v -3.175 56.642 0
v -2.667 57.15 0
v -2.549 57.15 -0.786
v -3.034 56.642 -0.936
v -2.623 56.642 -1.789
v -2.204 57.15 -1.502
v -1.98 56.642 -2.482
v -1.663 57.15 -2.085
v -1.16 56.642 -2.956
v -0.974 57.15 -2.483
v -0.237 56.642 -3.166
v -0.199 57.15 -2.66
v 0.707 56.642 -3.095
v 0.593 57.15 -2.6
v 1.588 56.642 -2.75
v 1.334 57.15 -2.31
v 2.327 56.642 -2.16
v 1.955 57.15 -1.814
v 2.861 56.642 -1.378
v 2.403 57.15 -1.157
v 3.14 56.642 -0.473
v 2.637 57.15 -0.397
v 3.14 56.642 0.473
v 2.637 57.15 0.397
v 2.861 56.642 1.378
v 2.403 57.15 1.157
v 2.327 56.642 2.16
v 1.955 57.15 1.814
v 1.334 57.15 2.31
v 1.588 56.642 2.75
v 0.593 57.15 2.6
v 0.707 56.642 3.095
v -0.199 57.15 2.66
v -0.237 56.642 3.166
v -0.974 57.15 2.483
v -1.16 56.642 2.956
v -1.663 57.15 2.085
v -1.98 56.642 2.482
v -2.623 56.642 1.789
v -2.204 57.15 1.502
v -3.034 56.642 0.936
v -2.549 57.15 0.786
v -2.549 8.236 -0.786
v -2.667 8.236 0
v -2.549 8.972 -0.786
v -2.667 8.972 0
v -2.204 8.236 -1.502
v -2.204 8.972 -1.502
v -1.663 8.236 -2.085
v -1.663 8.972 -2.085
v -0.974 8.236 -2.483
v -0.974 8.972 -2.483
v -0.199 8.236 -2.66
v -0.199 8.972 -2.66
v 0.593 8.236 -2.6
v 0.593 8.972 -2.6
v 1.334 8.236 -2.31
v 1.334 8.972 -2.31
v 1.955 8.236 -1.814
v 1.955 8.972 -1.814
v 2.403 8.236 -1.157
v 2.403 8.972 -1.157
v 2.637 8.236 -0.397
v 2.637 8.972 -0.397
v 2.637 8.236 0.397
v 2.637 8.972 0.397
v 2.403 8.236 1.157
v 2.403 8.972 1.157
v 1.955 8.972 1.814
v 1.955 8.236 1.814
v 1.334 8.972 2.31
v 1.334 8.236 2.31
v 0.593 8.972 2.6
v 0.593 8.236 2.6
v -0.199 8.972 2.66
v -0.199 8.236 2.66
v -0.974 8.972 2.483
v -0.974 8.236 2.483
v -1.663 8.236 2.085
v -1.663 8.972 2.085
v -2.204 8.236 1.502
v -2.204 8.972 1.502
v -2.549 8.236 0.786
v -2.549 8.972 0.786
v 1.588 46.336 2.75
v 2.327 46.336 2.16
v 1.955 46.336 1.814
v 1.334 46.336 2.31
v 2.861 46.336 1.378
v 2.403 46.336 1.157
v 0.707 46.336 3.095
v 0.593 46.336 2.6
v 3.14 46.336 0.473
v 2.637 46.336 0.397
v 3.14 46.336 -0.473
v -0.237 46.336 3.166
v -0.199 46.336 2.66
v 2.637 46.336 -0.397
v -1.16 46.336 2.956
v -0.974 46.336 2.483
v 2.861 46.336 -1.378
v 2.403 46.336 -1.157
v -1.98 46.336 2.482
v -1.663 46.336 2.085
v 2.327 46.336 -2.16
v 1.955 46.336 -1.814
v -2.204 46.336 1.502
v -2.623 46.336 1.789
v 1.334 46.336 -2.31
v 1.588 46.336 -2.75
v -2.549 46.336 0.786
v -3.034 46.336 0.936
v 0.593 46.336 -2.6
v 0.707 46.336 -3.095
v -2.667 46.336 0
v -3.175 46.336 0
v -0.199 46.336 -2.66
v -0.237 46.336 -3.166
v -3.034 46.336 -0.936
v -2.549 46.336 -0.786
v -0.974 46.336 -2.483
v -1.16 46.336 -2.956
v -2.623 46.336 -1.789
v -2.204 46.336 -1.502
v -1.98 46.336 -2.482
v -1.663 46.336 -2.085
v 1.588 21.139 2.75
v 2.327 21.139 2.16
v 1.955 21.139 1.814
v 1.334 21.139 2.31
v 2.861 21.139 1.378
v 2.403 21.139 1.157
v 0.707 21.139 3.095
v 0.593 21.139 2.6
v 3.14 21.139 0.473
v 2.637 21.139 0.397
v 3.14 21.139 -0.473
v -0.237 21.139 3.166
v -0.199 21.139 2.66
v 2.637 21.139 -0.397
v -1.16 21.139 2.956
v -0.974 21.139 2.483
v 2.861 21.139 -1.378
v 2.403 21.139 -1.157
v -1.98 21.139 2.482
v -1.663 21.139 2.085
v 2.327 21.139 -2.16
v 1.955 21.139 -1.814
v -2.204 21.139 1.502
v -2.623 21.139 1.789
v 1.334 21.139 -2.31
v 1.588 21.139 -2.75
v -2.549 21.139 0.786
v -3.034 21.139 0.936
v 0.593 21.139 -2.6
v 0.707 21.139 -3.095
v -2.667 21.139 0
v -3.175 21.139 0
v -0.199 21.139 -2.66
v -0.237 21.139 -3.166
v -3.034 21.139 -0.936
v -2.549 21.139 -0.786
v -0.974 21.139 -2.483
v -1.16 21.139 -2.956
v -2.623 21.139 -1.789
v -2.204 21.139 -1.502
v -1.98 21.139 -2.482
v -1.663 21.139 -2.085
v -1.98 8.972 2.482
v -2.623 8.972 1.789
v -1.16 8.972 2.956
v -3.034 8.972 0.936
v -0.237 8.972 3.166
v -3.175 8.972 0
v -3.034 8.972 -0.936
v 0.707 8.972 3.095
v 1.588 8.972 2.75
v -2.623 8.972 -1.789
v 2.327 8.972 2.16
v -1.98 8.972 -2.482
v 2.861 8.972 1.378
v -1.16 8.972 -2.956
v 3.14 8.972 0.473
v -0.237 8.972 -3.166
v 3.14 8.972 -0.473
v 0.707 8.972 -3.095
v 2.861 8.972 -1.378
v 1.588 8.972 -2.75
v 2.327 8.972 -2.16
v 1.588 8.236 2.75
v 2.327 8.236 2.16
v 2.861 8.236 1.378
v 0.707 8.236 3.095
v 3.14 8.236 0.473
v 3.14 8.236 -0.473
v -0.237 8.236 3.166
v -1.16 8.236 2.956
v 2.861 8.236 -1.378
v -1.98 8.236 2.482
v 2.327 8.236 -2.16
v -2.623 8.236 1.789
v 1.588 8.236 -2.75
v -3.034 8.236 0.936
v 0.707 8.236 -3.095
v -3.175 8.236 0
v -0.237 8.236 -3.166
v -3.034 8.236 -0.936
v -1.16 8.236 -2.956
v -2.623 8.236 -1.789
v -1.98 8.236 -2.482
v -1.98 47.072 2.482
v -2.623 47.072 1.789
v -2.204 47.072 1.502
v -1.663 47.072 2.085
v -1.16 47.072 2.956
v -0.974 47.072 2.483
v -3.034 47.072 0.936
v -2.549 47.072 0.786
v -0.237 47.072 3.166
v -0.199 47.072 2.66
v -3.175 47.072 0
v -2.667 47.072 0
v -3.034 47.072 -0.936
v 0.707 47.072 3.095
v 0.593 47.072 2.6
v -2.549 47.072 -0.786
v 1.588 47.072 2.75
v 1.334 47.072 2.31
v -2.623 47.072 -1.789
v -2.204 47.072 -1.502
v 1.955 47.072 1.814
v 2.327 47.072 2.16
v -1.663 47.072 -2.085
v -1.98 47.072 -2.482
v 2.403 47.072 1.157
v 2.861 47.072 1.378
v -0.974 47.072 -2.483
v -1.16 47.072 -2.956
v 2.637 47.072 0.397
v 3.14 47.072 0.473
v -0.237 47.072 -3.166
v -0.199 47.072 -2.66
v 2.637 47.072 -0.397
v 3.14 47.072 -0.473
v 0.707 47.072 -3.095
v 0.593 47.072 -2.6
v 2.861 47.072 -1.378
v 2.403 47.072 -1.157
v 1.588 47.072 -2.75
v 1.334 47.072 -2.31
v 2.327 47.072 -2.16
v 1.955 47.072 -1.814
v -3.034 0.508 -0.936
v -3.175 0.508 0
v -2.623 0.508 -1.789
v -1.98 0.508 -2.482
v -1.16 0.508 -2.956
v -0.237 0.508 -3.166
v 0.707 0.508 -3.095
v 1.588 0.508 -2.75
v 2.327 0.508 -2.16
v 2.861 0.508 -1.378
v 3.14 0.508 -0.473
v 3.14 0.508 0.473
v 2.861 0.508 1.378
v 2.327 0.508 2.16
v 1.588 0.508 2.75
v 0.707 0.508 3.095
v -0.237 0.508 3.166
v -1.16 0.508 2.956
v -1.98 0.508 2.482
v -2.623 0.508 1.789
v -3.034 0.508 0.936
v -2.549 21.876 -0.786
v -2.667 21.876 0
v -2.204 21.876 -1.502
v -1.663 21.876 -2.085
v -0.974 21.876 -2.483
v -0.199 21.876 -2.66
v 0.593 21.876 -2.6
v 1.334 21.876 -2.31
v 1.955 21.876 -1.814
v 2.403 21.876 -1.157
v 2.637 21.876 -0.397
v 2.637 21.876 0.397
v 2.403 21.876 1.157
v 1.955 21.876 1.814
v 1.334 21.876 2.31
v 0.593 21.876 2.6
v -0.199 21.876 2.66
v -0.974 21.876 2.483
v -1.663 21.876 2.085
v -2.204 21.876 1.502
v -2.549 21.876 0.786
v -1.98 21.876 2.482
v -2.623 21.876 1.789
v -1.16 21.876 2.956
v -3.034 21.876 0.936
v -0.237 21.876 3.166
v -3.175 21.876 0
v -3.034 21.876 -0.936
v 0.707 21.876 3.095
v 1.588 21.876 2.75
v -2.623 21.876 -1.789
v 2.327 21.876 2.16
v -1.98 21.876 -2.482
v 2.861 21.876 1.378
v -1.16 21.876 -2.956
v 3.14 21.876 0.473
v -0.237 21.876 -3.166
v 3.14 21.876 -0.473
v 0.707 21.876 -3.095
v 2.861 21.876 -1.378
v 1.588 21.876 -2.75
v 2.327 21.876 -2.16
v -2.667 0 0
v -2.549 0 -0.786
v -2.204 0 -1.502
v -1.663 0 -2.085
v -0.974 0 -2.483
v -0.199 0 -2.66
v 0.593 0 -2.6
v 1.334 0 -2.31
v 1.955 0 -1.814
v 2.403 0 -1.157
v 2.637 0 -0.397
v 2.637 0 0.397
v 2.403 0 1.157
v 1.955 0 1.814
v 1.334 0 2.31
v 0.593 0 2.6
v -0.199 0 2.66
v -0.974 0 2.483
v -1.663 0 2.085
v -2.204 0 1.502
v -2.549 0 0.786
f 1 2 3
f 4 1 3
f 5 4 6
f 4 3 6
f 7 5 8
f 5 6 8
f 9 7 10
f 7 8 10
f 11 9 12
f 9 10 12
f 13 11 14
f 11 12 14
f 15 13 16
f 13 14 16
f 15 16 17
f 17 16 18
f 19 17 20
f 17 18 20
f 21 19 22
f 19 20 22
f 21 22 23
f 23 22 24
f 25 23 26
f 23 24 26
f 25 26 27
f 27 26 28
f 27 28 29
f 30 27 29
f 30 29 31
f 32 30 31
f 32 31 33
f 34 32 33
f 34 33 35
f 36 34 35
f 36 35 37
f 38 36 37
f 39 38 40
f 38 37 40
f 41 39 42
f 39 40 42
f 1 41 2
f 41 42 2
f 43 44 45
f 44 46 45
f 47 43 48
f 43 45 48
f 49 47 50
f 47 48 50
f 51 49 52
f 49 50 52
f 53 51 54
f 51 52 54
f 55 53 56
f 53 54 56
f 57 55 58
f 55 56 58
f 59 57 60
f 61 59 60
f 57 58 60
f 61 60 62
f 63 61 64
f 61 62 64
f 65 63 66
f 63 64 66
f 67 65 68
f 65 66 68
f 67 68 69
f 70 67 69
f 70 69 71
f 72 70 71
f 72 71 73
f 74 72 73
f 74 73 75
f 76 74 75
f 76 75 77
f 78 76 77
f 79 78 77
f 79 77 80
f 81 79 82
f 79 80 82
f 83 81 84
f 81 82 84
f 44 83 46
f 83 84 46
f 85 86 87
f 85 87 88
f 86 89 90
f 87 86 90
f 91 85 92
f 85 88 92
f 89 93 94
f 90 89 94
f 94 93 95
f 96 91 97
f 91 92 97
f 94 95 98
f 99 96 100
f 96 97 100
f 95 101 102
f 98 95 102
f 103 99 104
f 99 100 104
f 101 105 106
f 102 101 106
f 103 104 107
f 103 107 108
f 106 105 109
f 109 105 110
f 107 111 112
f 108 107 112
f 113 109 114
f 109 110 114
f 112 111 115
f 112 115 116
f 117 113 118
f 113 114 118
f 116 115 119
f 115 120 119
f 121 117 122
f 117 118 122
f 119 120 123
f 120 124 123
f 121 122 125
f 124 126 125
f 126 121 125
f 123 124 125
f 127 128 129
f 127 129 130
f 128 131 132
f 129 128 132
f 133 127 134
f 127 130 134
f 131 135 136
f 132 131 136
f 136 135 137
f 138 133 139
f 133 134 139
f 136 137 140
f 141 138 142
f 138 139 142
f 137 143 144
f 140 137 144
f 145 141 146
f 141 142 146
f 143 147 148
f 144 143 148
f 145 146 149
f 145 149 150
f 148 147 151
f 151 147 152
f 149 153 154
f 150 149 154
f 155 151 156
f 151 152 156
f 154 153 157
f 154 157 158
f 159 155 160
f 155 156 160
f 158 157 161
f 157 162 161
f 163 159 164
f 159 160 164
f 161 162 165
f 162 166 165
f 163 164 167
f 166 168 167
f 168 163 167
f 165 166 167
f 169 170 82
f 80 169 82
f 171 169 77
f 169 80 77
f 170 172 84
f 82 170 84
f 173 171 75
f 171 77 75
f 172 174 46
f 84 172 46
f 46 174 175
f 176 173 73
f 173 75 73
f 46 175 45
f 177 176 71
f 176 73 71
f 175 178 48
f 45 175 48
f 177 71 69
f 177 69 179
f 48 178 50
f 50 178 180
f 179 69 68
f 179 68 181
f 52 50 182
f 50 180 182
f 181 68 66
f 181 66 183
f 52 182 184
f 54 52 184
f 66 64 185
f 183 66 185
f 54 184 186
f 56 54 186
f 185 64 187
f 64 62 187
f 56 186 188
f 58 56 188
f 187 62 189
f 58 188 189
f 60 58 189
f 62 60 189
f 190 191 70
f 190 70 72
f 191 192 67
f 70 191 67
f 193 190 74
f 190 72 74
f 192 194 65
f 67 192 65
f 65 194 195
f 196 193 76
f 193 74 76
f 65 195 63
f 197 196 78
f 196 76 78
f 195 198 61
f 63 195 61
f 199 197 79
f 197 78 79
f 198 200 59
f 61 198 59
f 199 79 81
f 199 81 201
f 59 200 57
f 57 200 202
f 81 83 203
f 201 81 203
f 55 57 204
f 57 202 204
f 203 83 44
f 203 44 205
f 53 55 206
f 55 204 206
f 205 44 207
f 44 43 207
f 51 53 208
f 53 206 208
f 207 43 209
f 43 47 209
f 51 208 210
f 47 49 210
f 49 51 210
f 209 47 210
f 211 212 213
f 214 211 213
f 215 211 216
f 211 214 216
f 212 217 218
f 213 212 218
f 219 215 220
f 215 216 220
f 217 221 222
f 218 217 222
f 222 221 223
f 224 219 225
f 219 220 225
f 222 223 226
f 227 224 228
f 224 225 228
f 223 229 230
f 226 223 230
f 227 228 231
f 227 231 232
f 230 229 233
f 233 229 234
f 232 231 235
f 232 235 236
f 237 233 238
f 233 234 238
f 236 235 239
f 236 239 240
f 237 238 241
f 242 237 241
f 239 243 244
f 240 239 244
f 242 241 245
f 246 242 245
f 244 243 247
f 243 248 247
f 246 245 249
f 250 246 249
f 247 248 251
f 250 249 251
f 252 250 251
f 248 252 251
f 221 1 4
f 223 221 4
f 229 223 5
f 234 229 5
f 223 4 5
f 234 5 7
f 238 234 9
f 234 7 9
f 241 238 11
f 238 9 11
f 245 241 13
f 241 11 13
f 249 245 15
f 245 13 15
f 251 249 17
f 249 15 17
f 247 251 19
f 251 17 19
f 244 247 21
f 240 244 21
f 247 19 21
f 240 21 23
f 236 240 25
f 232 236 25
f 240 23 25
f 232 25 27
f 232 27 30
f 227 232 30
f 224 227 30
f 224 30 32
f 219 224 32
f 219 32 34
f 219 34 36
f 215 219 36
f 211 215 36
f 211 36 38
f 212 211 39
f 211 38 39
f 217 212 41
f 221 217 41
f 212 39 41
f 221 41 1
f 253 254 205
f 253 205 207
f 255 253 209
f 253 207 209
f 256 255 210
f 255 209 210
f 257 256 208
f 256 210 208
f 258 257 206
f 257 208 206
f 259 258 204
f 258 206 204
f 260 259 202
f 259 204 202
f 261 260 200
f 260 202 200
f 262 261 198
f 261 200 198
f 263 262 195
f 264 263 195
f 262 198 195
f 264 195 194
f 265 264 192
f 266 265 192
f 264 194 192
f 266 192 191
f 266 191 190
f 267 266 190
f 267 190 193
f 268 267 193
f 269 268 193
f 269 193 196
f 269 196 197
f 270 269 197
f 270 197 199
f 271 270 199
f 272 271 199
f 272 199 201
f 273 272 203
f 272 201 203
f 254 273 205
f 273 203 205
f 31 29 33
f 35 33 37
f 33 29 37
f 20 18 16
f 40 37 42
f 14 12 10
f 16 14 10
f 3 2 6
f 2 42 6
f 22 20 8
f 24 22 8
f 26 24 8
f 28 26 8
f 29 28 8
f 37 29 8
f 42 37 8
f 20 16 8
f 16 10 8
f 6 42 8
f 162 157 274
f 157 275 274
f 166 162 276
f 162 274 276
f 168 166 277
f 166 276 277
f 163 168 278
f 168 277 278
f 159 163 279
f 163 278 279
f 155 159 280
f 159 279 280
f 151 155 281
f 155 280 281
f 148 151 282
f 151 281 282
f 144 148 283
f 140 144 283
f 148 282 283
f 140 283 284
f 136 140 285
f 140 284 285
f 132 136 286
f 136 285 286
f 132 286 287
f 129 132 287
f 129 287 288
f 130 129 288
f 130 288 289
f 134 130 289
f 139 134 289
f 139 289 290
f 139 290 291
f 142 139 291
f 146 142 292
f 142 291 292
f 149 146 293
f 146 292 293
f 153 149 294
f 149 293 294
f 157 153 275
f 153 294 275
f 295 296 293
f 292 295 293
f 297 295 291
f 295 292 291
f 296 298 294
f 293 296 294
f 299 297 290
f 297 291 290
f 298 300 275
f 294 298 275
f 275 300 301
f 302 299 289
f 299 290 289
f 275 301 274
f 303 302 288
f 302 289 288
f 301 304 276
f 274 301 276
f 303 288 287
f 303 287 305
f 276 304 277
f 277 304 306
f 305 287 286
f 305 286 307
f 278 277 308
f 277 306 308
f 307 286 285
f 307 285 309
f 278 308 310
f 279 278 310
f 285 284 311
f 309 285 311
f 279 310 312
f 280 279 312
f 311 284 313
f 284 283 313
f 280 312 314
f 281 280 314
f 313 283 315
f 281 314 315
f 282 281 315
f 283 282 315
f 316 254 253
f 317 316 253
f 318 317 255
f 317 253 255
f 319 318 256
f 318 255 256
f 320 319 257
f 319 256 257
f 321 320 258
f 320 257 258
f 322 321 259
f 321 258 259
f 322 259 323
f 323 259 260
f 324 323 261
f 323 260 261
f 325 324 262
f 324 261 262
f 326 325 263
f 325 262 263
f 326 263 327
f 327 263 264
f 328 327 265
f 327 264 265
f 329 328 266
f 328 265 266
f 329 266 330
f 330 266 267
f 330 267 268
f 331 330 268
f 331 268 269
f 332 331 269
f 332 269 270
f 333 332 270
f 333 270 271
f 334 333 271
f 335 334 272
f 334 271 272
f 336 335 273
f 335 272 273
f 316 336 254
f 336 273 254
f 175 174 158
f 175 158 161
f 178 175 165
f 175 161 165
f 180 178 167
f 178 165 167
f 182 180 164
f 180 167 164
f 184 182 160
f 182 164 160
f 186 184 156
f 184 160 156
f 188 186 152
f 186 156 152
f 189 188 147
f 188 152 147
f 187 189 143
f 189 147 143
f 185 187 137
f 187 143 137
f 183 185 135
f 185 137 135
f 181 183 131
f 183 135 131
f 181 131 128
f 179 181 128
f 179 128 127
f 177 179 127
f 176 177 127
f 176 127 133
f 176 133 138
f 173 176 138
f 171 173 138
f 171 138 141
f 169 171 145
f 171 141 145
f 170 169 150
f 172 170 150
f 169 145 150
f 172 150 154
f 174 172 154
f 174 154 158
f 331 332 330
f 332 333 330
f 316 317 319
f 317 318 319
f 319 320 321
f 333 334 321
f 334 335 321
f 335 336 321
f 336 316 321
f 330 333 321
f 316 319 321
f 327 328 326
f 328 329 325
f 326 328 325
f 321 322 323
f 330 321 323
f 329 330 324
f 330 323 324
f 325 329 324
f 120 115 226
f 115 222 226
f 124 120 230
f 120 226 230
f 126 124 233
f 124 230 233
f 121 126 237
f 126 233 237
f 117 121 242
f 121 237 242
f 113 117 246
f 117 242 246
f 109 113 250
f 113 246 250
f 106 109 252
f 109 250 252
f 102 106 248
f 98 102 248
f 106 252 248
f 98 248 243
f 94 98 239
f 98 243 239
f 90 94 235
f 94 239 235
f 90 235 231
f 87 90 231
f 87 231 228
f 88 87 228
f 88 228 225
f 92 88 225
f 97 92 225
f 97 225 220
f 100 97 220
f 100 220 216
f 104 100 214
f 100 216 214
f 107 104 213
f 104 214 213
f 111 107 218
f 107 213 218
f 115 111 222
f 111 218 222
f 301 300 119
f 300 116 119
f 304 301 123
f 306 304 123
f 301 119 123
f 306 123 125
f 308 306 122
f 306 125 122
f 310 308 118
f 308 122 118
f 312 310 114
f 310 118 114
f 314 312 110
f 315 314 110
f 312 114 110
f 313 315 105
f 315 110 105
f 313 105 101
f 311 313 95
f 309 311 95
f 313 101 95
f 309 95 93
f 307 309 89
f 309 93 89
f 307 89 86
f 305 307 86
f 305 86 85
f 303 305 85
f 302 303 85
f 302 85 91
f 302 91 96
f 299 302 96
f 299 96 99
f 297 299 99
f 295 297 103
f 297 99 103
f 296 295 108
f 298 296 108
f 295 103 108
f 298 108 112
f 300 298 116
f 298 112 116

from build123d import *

# Parameters (mm, degrees)
CHAMFER1_SIZE = 0.508


with BuildPart() as part:
    # Sketch1 → Revolve1 (revolve)
    with BuildSketch(Plane.XY):
        Polygon((-3.175, 47.0723), (-3.175, 57.15), (0, 57.15), (0, 0), (-3.175, 0), (-3.175, 8.2357), (-2.667, 8.2357), (-2.667, 8.9723), (-3.175, 8.9723), (-3.175, 21.1389), (-2.667, 21.1389), (-2.667, 21.8755), (-3.175, 21.8755), (-3.175, 46.3357), (-2.667, 46.3357), (-2.667, 47.0723), align=None)
    revolve(axis=Axis((0, 0, 0), (0, -1, 0)))

    # Chamfer1
    chamfer1_edges = [part.edges().sort_by_distance(p)[0] for p in [
        (3.175, 0, 0),
        (3.175, 57.15, 0),
    ]]
    chamfer(chamfer1_edges, length=CHAMFER1_SIZE)


solid = part.part
